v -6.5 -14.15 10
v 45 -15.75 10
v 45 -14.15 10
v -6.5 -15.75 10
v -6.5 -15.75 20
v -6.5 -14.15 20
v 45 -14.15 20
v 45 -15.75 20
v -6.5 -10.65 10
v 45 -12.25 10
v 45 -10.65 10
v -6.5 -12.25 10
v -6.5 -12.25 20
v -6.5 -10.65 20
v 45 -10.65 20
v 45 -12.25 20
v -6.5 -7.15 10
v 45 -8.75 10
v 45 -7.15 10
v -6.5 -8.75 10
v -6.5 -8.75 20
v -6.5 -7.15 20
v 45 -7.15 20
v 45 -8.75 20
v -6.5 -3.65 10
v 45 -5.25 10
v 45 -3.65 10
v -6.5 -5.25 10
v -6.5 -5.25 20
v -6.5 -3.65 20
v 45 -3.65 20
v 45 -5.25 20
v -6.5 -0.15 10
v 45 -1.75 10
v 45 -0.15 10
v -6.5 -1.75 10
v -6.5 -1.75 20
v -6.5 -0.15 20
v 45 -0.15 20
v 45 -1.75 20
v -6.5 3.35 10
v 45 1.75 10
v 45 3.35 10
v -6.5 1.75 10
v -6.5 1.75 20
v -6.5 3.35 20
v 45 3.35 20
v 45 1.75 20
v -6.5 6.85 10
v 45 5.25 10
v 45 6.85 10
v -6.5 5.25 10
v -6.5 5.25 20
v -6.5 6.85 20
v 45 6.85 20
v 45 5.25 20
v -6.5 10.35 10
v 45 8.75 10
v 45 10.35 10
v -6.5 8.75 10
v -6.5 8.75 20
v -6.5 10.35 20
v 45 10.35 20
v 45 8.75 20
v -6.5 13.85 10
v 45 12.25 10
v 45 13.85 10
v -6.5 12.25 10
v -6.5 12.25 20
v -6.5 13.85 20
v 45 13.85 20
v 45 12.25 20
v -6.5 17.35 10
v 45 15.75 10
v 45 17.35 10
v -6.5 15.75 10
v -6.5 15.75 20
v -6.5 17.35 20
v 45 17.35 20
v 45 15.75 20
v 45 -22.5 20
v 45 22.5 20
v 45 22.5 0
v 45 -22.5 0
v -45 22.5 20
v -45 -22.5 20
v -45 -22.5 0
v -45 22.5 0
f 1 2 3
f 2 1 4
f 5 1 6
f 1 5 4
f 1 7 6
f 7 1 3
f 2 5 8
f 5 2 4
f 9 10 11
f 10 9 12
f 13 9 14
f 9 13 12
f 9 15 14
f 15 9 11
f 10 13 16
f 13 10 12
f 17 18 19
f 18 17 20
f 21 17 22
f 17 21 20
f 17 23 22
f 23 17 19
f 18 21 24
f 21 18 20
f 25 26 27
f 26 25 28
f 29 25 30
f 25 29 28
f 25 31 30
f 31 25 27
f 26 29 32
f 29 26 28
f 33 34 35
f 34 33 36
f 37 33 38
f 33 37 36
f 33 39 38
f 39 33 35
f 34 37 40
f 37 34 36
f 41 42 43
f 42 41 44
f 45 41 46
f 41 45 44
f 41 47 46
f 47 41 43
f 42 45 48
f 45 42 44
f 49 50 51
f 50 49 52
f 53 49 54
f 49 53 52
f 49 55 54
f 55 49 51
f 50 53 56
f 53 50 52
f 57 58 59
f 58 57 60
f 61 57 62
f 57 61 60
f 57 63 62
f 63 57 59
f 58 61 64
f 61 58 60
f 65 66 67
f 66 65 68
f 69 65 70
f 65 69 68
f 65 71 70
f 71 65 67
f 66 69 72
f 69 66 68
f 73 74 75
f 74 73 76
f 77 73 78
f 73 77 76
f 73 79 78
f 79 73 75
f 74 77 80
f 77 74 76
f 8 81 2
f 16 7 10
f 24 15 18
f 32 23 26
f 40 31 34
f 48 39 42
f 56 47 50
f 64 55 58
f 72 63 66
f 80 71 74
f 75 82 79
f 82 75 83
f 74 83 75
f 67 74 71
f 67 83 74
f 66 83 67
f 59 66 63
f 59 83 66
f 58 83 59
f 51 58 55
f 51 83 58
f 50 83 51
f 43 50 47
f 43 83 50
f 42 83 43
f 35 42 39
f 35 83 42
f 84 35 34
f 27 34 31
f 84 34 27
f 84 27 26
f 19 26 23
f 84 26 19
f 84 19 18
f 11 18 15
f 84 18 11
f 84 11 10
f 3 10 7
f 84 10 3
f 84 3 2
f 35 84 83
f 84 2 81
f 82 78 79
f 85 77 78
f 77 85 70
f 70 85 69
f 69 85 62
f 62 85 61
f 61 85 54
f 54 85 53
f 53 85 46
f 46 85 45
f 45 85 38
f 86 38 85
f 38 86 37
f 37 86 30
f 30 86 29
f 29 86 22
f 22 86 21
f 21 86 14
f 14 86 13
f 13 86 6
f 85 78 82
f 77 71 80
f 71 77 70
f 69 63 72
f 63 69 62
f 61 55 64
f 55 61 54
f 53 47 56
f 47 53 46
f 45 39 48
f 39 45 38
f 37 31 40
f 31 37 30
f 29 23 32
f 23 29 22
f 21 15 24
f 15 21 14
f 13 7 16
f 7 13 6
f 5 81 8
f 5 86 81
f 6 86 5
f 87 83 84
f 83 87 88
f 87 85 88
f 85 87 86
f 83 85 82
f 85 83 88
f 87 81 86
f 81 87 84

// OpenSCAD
// Slides drying rack
// Print orientation: base block on XY plane, slots open upward (+Z)

// ---------- Block ----------
block_l = 90;    // block length along X (mm)
block_w = 45;    // block width along Y (mm)
block_h = 20;    // block height along Z (mm)

// ---------- Slots ----------
slot_n     = 10;   // number of slide slots
slot_len   = 77;   // slot length along X (mm)
slot_w     = 1.6;  // slot width along Y (mm)
slot_d     = 10;   // slot depth from top face (mm)
slot_pitch = 3.5;  // centre-to-centre spacing along Y (mm)

// ---------- Misc ----------
eps = 0.5;       // overcut past faces to avoid coplanar surfaces
$fn = 64;

// X position of first slot so the group is centred on the block
slot_x0 = -(block_l - slot_len) / 2;

difference() {
    // Base block
    translate([-block_l / 2, -block_w / 2, 0])
        cube([block_l, block_w, block_h]);

    // Parallel slots running along X, centred in X and Y
    for (i = [0 : slot_n - 1]) {
        translate([slot_x0,
                   (i - (slot_n - 1) / 2) * slot_pitch,
                   block_h - slot_d])
            cube([slot_len, slot_w, slot_d + eps]);
    }
}
